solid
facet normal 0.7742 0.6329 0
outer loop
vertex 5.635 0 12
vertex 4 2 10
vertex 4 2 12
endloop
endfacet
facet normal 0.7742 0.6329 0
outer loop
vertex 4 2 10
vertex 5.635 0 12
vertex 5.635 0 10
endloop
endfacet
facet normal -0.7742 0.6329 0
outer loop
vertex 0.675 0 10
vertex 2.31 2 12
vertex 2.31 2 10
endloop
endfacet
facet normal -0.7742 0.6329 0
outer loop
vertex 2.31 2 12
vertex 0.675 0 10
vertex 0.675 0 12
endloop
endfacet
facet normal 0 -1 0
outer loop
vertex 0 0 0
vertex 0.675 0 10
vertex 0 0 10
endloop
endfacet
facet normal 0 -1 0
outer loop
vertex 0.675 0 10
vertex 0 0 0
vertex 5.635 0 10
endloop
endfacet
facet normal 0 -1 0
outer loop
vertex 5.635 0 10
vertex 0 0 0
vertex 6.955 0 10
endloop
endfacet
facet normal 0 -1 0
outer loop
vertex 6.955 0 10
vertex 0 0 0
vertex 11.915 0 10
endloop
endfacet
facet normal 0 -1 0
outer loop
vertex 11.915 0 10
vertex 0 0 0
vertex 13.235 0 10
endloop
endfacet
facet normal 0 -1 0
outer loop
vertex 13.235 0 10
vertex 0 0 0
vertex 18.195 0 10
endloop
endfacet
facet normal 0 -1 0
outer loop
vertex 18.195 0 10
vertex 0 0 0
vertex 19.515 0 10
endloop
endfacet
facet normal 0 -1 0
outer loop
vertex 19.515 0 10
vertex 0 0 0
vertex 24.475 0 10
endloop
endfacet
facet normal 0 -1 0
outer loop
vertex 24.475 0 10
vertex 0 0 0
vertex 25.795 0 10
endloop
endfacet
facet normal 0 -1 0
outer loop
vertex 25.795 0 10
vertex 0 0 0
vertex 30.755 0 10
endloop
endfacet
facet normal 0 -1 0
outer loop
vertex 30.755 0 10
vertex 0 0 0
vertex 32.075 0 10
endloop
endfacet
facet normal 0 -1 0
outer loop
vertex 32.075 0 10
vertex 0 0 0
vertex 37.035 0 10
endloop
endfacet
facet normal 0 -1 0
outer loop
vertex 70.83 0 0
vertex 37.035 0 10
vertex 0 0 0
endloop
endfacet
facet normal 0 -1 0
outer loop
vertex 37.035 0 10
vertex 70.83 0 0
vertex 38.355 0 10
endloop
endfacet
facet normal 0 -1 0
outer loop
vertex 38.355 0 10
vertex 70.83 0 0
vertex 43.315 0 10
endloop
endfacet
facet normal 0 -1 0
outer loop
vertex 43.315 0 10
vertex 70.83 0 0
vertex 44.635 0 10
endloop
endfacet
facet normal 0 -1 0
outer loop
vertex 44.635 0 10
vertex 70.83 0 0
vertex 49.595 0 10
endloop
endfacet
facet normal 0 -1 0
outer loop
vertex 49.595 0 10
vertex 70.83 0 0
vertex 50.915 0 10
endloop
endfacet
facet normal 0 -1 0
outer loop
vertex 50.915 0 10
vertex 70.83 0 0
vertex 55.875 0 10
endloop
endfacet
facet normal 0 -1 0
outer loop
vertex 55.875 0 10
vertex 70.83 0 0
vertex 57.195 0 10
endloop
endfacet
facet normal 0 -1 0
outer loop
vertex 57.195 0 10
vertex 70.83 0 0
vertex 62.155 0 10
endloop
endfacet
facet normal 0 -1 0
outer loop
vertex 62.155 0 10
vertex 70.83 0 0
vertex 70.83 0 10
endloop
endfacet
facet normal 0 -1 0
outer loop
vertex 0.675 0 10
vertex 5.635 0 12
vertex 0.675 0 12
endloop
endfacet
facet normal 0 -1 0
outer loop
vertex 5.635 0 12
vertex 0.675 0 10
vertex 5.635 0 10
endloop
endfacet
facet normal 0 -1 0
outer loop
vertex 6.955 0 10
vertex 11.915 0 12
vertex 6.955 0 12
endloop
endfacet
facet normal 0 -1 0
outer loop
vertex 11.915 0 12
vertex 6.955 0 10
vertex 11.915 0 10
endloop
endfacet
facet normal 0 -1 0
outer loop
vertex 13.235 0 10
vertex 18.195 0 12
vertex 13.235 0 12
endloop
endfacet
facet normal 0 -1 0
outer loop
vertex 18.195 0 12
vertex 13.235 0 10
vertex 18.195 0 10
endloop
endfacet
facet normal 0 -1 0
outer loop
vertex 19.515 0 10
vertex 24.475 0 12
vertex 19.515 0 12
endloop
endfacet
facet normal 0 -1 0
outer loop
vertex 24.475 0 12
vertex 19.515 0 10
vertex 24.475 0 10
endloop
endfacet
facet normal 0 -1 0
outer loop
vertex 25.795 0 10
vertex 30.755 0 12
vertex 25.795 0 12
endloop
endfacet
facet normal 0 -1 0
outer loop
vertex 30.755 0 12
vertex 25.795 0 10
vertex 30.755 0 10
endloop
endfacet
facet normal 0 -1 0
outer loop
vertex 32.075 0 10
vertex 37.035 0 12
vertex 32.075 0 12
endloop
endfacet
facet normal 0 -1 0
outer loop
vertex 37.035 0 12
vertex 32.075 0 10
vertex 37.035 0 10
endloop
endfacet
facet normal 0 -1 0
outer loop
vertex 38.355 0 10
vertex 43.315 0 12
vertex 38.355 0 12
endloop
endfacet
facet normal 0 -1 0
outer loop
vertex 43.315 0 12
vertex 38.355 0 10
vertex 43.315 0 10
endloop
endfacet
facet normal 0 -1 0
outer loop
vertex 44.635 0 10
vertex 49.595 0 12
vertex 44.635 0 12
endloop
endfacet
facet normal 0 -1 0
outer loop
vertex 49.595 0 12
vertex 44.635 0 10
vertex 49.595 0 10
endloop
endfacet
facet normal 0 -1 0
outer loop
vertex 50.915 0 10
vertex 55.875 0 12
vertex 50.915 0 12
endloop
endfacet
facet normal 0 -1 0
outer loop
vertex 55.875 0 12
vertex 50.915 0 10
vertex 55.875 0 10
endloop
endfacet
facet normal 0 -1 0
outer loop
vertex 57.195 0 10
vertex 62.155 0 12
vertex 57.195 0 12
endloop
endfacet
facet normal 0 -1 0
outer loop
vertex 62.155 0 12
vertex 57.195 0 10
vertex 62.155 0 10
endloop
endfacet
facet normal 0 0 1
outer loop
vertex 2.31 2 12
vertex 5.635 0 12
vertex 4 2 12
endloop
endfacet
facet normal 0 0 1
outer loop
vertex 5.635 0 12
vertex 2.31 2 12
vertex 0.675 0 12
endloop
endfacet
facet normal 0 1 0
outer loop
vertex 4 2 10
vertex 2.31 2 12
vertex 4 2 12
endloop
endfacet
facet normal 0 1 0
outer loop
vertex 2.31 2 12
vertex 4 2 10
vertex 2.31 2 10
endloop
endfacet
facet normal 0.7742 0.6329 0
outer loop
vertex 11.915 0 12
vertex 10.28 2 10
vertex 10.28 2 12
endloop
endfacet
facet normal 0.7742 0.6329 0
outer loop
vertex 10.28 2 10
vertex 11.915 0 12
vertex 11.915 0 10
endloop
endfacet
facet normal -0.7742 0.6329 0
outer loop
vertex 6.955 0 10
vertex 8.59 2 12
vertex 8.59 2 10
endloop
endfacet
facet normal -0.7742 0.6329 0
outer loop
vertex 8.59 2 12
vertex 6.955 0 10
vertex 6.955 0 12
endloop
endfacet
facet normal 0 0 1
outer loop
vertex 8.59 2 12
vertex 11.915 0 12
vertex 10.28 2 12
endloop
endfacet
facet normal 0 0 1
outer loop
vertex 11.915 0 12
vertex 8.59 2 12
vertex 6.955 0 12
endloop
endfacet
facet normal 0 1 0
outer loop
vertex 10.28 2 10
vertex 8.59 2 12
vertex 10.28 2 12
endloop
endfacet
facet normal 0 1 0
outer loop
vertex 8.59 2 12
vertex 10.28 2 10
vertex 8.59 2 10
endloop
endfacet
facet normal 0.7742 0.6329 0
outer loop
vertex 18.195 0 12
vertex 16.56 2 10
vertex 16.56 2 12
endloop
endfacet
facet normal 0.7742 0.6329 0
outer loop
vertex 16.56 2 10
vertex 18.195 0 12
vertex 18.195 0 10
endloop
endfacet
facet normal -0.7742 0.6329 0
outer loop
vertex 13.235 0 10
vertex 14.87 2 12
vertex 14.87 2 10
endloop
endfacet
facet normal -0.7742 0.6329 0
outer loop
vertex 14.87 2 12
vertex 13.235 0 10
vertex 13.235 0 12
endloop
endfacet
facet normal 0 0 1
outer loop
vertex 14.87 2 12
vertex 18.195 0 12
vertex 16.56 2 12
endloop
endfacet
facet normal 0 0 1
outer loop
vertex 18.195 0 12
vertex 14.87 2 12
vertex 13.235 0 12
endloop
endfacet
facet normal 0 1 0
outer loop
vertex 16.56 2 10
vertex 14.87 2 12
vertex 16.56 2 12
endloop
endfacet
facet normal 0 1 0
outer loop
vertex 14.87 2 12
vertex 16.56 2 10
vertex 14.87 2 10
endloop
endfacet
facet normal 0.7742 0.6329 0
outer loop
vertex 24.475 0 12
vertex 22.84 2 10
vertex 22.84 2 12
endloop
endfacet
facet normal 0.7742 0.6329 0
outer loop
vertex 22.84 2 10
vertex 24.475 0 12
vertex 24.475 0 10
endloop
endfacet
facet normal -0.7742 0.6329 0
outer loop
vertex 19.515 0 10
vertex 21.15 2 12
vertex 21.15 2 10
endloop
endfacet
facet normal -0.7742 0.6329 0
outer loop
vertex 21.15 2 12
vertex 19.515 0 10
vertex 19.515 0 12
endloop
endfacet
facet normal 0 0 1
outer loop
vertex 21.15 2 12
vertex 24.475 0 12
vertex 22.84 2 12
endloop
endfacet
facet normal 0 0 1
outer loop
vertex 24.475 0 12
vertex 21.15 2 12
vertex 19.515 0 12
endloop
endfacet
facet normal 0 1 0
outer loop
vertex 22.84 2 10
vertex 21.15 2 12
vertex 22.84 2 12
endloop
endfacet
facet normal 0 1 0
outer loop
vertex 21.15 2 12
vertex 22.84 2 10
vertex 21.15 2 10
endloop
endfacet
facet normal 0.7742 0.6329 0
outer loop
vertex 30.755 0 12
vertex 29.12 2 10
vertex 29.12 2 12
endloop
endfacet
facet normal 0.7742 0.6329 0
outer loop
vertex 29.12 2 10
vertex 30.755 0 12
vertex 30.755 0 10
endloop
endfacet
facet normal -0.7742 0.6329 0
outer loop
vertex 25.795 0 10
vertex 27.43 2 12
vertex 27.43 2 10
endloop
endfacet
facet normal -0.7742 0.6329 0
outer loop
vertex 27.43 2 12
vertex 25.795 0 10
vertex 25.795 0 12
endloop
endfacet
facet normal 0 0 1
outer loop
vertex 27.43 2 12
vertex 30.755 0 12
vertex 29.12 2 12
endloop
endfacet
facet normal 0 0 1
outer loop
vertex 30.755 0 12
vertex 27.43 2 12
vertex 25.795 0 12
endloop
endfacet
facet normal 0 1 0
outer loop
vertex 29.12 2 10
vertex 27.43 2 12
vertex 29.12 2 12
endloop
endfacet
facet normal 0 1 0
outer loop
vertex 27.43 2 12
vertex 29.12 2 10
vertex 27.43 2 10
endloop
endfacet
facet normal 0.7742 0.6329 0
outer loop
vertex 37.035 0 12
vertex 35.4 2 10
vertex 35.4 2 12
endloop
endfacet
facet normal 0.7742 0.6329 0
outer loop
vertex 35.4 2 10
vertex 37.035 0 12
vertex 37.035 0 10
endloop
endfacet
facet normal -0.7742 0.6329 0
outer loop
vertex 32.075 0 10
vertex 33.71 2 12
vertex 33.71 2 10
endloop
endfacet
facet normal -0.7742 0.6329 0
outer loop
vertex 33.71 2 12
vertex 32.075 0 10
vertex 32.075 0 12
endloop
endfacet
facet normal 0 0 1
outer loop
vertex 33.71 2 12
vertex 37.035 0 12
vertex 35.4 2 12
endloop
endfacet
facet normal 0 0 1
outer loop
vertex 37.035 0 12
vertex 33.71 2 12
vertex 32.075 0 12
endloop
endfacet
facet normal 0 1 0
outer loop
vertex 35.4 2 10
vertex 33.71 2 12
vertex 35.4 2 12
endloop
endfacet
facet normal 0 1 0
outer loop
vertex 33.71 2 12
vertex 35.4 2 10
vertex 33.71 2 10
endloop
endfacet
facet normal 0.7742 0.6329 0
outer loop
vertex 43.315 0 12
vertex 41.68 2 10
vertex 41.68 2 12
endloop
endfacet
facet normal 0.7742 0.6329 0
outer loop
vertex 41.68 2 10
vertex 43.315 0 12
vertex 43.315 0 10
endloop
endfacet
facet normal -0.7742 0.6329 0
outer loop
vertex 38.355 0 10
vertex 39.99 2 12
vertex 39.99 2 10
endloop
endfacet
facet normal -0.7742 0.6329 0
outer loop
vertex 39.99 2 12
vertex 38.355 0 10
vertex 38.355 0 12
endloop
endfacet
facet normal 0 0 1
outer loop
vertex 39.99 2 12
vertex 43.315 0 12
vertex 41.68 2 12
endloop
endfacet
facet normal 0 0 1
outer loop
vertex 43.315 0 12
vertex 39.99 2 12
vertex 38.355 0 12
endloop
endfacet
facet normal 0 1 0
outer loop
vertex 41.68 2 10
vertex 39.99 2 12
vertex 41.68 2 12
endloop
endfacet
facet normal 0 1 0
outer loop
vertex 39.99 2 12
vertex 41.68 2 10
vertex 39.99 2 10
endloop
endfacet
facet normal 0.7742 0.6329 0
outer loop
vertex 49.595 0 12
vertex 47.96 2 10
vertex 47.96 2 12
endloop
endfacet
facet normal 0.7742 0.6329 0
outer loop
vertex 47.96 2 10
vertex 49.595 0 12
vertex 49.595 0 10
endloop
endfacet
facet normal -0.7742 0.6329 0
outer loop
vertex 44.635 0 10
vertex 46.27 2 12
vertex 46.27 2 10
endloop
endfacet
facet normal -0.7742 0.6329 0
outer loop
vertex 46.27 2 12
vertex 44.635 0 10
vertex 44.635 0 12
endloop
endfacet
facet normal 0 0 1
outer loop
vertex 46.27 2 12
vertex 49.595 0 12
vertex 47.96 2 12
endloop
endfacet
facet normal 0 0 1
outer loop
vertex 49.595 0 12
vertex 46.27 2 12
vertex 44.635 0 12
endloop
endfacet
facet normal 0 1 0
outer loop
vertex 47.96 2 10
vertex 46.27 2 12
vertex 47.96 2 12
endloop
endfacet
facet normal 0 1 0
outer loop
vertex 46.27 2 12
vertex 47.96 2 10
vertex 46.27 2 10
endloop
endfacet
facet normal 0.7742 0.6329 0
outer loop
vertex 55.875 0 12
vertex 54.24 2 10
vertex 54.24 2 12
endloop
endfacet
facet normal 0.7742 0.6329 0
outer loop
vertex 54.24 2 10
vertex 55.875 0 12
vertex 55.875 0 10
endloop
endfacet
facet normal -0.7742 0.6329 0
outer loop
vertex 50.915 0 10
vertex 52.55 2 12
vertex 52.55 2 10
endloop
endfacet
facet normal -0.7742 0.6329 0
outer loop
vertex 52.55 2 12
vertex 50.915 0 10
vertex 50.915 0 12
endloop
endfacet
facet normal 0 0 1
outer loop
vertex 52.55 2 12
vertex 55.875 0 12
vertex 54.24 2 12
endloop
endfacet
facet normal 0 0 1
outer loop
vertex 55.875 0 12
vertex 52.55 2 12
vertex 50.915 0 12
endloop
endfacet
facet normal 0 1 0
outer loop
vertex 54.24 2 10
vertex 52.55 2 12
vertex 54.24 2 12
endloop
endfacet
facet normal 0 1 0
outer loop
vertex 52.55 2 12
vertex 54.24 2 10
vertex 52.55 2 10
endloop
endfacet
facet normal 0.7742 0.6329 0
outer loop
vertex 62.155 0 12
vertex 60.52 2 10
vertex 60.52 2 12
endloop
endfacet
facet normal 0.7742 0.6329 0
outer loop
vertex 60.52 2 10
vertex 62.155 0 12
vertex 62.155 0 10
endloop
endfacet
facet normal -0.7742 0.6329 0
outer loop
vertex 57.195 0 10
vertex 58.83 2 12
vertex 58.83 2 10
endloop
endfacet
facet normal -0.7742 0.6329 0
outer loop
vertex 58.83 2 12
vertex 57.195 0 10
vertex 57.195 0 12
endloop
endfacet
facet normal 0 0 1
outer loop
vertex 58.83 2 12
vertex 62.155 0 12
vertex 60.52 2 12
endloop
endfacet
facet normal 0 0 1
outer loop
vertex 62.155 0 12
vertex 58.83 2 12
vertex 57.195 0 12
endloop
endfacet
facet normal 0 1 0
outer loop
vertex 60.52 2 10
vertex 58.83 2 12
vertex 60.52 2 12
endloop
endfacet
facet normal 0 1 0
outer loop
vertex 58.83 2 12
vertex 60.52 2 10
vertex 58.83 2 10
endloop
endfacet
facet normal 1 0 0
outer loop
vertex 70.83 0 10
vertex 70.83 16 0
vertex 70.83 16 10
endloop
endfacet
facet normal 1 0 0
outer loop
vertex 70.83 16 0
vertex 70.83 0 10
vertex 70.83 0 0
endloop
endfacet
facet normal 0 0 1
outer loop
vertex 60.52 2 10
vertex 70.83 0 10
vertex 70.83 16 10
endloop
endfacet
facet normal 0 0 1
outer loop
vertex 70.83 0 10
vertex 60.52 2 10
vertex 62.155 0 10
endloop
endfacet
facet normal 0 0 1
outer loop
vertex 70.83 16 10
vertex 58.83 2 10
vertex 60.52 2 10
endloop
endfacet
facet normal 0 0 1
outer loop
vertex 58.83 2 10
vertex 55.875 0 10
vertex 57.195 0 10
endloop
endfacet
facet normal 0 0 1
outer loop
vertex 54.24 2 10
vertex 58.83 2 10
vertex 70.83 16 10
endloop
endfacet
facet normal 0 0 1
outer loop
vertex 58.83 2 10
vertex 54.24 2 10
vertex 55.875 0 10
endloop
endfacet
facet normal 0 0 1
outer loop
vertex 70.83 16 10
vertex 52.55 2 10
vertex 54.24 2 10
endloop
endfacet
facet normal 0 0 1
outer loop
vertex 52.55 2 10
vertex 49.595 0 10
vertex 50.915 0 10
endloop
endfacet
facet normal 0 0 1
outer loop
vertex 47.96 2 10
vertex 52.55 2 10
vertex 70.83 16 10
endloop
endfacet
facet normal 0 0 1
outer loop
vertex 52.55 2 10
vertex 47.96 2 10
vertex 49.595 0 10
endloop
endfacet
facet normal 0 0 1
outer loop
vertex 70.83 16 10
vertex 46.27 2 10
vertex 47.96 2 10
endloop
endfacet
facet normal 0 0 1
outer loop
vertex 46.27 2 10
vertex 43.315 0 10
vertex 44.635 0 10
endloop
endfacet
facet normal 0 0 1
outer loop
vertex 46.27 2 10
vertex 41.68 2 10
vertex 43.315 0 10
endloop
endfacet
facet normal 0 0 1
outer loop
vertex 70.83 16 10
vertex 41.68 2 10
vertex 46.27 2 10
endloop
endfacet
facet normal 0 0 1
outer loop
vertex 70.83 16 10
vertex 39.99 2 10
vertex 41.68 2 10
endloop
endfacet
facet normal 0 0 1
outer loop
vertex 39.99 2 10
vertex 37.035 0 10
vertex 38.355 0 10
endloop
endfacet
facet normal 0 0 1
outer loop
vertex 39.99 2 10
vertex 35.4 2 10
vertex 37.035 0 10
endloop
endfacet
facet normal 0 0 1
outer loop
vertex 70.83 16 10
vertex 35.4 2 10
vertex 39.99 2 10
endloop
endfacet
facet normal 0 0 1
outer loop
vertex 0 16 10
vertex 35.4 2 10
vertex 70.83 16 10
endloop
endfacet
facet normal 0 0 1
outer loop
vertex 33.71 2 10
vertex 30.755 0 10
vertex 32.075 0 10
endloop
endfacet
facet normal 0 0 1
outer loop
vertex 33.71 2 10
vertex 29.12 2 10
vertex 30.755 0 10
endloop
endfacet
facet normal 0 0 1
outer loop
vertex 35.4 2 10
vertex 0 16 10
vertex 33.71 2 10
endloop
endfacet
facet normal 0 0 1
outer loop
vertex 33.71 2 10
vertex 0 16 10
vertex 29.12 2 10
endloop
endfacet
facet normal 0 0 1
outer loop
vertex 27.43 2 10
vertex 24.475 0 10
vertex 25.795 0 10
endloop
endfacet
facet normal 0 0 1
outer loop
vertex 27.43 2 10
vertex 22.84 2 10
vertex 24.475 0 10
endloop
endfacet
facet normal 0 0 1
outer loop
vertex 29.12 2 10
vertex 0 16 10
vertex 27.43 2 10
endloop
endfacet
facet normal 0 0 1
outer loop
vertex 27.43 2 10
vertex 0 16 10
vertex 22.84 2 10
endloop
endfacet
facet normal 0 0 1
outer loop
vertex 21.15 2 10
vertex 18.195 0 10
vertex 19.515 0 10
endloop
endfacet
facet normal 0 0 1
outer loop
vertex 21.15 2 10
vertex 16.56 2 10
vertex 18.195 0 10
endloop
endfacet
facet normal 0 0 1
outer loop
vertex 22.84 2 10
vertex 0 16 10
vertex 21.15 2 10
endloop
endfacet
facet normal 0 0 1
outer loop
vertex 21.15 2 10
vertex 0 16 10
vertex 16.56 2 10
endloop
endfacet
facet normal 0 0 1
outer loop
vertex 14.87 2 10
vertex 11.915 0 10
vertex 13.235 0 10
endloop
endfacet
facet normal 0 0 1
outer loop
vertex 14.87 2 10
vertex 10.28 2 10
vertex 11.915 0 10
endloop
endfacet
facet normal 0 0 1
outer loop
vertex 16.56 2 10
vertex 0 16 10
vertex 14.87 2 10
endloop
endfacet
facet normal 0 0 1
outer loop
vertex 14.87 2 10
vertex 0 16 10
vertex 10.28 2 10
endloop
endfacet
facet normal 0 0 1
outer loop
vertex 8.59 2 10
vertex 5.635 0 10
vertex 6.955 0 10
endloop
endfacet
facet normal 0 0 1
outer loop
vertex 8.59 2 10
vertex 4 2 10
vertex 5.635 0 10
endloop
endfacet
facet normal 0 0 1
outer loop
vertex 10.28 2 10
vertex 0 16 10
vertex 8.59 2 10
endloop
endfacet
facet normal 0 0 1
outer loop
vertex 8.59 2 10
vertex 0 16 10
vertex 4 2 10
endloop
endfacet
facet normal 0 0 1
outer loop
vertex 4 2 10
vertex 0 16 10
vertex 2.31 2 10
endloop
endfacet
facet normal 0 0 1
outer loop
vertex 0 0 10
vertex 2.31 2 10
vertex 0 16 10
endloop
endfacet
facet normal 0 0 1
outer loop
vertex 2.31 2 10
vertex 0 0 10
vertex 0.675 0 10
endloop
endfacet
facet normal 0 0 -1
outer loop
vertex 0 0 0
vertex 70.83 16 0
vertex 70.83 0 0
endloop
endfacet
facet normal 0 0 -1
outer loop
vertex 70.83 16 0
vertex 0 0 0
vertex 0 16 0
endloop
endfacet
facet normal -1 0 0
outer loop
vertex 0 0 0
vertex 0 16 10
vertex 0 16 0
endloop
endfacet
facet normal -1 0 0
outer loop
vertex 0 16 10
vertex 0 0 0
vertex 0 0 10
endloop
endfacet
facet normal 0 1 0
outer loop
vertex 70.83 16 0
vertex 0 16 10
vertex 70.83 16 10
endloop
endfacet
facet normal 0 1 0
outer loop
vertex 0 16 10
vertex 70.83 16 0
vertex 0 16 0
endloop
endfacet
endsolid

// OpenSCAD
$fn = 32;

// ----------------------------------------------------------------------
// Gear rack: m=2 z=10, 70.83 x 16 x 12 mm
// ----------------------------------------------------------------------

// --- parameters (mm) ---
bar_len = 70.83;          // rack length, X
bar_w = 16;               // rack width, Y
bar_h = 12;               // overall height, Z
gear_module = 2;          // module
base_t = 10;              // tooth root line height
pitch = 6.28;             // circular pitch
tip_w = 1.69;             // tooth thickness at the tip
root_w = 4.96;            // tooth thickness at the root line
sink = 0.6;               // tooth root overlap into the body

tooth_span = 62.83;

module tooth(x0) {
  /* 20 deg flank profile, sunk into the body for a positive overlap */
  translate([x0, 0, base_t - sink])
    linear_extrude(height = bar_h - base_t + sink)
      polygon(points = [[-root_w / 2, 0], [root_w / 2, 0],
                        [tip_w / 2, bar_h - base_t],
                        [-tip_w / 2, bar_h - base_t]]);
}

difference() {
  union() {
    cube([bar_len, bar_w, base_t]);
    for (i = [0 : 10 - 1])
      tooth((i + 0.5) * pitch + (tooth_span - 10 * pitch) / 2);
  }
}
